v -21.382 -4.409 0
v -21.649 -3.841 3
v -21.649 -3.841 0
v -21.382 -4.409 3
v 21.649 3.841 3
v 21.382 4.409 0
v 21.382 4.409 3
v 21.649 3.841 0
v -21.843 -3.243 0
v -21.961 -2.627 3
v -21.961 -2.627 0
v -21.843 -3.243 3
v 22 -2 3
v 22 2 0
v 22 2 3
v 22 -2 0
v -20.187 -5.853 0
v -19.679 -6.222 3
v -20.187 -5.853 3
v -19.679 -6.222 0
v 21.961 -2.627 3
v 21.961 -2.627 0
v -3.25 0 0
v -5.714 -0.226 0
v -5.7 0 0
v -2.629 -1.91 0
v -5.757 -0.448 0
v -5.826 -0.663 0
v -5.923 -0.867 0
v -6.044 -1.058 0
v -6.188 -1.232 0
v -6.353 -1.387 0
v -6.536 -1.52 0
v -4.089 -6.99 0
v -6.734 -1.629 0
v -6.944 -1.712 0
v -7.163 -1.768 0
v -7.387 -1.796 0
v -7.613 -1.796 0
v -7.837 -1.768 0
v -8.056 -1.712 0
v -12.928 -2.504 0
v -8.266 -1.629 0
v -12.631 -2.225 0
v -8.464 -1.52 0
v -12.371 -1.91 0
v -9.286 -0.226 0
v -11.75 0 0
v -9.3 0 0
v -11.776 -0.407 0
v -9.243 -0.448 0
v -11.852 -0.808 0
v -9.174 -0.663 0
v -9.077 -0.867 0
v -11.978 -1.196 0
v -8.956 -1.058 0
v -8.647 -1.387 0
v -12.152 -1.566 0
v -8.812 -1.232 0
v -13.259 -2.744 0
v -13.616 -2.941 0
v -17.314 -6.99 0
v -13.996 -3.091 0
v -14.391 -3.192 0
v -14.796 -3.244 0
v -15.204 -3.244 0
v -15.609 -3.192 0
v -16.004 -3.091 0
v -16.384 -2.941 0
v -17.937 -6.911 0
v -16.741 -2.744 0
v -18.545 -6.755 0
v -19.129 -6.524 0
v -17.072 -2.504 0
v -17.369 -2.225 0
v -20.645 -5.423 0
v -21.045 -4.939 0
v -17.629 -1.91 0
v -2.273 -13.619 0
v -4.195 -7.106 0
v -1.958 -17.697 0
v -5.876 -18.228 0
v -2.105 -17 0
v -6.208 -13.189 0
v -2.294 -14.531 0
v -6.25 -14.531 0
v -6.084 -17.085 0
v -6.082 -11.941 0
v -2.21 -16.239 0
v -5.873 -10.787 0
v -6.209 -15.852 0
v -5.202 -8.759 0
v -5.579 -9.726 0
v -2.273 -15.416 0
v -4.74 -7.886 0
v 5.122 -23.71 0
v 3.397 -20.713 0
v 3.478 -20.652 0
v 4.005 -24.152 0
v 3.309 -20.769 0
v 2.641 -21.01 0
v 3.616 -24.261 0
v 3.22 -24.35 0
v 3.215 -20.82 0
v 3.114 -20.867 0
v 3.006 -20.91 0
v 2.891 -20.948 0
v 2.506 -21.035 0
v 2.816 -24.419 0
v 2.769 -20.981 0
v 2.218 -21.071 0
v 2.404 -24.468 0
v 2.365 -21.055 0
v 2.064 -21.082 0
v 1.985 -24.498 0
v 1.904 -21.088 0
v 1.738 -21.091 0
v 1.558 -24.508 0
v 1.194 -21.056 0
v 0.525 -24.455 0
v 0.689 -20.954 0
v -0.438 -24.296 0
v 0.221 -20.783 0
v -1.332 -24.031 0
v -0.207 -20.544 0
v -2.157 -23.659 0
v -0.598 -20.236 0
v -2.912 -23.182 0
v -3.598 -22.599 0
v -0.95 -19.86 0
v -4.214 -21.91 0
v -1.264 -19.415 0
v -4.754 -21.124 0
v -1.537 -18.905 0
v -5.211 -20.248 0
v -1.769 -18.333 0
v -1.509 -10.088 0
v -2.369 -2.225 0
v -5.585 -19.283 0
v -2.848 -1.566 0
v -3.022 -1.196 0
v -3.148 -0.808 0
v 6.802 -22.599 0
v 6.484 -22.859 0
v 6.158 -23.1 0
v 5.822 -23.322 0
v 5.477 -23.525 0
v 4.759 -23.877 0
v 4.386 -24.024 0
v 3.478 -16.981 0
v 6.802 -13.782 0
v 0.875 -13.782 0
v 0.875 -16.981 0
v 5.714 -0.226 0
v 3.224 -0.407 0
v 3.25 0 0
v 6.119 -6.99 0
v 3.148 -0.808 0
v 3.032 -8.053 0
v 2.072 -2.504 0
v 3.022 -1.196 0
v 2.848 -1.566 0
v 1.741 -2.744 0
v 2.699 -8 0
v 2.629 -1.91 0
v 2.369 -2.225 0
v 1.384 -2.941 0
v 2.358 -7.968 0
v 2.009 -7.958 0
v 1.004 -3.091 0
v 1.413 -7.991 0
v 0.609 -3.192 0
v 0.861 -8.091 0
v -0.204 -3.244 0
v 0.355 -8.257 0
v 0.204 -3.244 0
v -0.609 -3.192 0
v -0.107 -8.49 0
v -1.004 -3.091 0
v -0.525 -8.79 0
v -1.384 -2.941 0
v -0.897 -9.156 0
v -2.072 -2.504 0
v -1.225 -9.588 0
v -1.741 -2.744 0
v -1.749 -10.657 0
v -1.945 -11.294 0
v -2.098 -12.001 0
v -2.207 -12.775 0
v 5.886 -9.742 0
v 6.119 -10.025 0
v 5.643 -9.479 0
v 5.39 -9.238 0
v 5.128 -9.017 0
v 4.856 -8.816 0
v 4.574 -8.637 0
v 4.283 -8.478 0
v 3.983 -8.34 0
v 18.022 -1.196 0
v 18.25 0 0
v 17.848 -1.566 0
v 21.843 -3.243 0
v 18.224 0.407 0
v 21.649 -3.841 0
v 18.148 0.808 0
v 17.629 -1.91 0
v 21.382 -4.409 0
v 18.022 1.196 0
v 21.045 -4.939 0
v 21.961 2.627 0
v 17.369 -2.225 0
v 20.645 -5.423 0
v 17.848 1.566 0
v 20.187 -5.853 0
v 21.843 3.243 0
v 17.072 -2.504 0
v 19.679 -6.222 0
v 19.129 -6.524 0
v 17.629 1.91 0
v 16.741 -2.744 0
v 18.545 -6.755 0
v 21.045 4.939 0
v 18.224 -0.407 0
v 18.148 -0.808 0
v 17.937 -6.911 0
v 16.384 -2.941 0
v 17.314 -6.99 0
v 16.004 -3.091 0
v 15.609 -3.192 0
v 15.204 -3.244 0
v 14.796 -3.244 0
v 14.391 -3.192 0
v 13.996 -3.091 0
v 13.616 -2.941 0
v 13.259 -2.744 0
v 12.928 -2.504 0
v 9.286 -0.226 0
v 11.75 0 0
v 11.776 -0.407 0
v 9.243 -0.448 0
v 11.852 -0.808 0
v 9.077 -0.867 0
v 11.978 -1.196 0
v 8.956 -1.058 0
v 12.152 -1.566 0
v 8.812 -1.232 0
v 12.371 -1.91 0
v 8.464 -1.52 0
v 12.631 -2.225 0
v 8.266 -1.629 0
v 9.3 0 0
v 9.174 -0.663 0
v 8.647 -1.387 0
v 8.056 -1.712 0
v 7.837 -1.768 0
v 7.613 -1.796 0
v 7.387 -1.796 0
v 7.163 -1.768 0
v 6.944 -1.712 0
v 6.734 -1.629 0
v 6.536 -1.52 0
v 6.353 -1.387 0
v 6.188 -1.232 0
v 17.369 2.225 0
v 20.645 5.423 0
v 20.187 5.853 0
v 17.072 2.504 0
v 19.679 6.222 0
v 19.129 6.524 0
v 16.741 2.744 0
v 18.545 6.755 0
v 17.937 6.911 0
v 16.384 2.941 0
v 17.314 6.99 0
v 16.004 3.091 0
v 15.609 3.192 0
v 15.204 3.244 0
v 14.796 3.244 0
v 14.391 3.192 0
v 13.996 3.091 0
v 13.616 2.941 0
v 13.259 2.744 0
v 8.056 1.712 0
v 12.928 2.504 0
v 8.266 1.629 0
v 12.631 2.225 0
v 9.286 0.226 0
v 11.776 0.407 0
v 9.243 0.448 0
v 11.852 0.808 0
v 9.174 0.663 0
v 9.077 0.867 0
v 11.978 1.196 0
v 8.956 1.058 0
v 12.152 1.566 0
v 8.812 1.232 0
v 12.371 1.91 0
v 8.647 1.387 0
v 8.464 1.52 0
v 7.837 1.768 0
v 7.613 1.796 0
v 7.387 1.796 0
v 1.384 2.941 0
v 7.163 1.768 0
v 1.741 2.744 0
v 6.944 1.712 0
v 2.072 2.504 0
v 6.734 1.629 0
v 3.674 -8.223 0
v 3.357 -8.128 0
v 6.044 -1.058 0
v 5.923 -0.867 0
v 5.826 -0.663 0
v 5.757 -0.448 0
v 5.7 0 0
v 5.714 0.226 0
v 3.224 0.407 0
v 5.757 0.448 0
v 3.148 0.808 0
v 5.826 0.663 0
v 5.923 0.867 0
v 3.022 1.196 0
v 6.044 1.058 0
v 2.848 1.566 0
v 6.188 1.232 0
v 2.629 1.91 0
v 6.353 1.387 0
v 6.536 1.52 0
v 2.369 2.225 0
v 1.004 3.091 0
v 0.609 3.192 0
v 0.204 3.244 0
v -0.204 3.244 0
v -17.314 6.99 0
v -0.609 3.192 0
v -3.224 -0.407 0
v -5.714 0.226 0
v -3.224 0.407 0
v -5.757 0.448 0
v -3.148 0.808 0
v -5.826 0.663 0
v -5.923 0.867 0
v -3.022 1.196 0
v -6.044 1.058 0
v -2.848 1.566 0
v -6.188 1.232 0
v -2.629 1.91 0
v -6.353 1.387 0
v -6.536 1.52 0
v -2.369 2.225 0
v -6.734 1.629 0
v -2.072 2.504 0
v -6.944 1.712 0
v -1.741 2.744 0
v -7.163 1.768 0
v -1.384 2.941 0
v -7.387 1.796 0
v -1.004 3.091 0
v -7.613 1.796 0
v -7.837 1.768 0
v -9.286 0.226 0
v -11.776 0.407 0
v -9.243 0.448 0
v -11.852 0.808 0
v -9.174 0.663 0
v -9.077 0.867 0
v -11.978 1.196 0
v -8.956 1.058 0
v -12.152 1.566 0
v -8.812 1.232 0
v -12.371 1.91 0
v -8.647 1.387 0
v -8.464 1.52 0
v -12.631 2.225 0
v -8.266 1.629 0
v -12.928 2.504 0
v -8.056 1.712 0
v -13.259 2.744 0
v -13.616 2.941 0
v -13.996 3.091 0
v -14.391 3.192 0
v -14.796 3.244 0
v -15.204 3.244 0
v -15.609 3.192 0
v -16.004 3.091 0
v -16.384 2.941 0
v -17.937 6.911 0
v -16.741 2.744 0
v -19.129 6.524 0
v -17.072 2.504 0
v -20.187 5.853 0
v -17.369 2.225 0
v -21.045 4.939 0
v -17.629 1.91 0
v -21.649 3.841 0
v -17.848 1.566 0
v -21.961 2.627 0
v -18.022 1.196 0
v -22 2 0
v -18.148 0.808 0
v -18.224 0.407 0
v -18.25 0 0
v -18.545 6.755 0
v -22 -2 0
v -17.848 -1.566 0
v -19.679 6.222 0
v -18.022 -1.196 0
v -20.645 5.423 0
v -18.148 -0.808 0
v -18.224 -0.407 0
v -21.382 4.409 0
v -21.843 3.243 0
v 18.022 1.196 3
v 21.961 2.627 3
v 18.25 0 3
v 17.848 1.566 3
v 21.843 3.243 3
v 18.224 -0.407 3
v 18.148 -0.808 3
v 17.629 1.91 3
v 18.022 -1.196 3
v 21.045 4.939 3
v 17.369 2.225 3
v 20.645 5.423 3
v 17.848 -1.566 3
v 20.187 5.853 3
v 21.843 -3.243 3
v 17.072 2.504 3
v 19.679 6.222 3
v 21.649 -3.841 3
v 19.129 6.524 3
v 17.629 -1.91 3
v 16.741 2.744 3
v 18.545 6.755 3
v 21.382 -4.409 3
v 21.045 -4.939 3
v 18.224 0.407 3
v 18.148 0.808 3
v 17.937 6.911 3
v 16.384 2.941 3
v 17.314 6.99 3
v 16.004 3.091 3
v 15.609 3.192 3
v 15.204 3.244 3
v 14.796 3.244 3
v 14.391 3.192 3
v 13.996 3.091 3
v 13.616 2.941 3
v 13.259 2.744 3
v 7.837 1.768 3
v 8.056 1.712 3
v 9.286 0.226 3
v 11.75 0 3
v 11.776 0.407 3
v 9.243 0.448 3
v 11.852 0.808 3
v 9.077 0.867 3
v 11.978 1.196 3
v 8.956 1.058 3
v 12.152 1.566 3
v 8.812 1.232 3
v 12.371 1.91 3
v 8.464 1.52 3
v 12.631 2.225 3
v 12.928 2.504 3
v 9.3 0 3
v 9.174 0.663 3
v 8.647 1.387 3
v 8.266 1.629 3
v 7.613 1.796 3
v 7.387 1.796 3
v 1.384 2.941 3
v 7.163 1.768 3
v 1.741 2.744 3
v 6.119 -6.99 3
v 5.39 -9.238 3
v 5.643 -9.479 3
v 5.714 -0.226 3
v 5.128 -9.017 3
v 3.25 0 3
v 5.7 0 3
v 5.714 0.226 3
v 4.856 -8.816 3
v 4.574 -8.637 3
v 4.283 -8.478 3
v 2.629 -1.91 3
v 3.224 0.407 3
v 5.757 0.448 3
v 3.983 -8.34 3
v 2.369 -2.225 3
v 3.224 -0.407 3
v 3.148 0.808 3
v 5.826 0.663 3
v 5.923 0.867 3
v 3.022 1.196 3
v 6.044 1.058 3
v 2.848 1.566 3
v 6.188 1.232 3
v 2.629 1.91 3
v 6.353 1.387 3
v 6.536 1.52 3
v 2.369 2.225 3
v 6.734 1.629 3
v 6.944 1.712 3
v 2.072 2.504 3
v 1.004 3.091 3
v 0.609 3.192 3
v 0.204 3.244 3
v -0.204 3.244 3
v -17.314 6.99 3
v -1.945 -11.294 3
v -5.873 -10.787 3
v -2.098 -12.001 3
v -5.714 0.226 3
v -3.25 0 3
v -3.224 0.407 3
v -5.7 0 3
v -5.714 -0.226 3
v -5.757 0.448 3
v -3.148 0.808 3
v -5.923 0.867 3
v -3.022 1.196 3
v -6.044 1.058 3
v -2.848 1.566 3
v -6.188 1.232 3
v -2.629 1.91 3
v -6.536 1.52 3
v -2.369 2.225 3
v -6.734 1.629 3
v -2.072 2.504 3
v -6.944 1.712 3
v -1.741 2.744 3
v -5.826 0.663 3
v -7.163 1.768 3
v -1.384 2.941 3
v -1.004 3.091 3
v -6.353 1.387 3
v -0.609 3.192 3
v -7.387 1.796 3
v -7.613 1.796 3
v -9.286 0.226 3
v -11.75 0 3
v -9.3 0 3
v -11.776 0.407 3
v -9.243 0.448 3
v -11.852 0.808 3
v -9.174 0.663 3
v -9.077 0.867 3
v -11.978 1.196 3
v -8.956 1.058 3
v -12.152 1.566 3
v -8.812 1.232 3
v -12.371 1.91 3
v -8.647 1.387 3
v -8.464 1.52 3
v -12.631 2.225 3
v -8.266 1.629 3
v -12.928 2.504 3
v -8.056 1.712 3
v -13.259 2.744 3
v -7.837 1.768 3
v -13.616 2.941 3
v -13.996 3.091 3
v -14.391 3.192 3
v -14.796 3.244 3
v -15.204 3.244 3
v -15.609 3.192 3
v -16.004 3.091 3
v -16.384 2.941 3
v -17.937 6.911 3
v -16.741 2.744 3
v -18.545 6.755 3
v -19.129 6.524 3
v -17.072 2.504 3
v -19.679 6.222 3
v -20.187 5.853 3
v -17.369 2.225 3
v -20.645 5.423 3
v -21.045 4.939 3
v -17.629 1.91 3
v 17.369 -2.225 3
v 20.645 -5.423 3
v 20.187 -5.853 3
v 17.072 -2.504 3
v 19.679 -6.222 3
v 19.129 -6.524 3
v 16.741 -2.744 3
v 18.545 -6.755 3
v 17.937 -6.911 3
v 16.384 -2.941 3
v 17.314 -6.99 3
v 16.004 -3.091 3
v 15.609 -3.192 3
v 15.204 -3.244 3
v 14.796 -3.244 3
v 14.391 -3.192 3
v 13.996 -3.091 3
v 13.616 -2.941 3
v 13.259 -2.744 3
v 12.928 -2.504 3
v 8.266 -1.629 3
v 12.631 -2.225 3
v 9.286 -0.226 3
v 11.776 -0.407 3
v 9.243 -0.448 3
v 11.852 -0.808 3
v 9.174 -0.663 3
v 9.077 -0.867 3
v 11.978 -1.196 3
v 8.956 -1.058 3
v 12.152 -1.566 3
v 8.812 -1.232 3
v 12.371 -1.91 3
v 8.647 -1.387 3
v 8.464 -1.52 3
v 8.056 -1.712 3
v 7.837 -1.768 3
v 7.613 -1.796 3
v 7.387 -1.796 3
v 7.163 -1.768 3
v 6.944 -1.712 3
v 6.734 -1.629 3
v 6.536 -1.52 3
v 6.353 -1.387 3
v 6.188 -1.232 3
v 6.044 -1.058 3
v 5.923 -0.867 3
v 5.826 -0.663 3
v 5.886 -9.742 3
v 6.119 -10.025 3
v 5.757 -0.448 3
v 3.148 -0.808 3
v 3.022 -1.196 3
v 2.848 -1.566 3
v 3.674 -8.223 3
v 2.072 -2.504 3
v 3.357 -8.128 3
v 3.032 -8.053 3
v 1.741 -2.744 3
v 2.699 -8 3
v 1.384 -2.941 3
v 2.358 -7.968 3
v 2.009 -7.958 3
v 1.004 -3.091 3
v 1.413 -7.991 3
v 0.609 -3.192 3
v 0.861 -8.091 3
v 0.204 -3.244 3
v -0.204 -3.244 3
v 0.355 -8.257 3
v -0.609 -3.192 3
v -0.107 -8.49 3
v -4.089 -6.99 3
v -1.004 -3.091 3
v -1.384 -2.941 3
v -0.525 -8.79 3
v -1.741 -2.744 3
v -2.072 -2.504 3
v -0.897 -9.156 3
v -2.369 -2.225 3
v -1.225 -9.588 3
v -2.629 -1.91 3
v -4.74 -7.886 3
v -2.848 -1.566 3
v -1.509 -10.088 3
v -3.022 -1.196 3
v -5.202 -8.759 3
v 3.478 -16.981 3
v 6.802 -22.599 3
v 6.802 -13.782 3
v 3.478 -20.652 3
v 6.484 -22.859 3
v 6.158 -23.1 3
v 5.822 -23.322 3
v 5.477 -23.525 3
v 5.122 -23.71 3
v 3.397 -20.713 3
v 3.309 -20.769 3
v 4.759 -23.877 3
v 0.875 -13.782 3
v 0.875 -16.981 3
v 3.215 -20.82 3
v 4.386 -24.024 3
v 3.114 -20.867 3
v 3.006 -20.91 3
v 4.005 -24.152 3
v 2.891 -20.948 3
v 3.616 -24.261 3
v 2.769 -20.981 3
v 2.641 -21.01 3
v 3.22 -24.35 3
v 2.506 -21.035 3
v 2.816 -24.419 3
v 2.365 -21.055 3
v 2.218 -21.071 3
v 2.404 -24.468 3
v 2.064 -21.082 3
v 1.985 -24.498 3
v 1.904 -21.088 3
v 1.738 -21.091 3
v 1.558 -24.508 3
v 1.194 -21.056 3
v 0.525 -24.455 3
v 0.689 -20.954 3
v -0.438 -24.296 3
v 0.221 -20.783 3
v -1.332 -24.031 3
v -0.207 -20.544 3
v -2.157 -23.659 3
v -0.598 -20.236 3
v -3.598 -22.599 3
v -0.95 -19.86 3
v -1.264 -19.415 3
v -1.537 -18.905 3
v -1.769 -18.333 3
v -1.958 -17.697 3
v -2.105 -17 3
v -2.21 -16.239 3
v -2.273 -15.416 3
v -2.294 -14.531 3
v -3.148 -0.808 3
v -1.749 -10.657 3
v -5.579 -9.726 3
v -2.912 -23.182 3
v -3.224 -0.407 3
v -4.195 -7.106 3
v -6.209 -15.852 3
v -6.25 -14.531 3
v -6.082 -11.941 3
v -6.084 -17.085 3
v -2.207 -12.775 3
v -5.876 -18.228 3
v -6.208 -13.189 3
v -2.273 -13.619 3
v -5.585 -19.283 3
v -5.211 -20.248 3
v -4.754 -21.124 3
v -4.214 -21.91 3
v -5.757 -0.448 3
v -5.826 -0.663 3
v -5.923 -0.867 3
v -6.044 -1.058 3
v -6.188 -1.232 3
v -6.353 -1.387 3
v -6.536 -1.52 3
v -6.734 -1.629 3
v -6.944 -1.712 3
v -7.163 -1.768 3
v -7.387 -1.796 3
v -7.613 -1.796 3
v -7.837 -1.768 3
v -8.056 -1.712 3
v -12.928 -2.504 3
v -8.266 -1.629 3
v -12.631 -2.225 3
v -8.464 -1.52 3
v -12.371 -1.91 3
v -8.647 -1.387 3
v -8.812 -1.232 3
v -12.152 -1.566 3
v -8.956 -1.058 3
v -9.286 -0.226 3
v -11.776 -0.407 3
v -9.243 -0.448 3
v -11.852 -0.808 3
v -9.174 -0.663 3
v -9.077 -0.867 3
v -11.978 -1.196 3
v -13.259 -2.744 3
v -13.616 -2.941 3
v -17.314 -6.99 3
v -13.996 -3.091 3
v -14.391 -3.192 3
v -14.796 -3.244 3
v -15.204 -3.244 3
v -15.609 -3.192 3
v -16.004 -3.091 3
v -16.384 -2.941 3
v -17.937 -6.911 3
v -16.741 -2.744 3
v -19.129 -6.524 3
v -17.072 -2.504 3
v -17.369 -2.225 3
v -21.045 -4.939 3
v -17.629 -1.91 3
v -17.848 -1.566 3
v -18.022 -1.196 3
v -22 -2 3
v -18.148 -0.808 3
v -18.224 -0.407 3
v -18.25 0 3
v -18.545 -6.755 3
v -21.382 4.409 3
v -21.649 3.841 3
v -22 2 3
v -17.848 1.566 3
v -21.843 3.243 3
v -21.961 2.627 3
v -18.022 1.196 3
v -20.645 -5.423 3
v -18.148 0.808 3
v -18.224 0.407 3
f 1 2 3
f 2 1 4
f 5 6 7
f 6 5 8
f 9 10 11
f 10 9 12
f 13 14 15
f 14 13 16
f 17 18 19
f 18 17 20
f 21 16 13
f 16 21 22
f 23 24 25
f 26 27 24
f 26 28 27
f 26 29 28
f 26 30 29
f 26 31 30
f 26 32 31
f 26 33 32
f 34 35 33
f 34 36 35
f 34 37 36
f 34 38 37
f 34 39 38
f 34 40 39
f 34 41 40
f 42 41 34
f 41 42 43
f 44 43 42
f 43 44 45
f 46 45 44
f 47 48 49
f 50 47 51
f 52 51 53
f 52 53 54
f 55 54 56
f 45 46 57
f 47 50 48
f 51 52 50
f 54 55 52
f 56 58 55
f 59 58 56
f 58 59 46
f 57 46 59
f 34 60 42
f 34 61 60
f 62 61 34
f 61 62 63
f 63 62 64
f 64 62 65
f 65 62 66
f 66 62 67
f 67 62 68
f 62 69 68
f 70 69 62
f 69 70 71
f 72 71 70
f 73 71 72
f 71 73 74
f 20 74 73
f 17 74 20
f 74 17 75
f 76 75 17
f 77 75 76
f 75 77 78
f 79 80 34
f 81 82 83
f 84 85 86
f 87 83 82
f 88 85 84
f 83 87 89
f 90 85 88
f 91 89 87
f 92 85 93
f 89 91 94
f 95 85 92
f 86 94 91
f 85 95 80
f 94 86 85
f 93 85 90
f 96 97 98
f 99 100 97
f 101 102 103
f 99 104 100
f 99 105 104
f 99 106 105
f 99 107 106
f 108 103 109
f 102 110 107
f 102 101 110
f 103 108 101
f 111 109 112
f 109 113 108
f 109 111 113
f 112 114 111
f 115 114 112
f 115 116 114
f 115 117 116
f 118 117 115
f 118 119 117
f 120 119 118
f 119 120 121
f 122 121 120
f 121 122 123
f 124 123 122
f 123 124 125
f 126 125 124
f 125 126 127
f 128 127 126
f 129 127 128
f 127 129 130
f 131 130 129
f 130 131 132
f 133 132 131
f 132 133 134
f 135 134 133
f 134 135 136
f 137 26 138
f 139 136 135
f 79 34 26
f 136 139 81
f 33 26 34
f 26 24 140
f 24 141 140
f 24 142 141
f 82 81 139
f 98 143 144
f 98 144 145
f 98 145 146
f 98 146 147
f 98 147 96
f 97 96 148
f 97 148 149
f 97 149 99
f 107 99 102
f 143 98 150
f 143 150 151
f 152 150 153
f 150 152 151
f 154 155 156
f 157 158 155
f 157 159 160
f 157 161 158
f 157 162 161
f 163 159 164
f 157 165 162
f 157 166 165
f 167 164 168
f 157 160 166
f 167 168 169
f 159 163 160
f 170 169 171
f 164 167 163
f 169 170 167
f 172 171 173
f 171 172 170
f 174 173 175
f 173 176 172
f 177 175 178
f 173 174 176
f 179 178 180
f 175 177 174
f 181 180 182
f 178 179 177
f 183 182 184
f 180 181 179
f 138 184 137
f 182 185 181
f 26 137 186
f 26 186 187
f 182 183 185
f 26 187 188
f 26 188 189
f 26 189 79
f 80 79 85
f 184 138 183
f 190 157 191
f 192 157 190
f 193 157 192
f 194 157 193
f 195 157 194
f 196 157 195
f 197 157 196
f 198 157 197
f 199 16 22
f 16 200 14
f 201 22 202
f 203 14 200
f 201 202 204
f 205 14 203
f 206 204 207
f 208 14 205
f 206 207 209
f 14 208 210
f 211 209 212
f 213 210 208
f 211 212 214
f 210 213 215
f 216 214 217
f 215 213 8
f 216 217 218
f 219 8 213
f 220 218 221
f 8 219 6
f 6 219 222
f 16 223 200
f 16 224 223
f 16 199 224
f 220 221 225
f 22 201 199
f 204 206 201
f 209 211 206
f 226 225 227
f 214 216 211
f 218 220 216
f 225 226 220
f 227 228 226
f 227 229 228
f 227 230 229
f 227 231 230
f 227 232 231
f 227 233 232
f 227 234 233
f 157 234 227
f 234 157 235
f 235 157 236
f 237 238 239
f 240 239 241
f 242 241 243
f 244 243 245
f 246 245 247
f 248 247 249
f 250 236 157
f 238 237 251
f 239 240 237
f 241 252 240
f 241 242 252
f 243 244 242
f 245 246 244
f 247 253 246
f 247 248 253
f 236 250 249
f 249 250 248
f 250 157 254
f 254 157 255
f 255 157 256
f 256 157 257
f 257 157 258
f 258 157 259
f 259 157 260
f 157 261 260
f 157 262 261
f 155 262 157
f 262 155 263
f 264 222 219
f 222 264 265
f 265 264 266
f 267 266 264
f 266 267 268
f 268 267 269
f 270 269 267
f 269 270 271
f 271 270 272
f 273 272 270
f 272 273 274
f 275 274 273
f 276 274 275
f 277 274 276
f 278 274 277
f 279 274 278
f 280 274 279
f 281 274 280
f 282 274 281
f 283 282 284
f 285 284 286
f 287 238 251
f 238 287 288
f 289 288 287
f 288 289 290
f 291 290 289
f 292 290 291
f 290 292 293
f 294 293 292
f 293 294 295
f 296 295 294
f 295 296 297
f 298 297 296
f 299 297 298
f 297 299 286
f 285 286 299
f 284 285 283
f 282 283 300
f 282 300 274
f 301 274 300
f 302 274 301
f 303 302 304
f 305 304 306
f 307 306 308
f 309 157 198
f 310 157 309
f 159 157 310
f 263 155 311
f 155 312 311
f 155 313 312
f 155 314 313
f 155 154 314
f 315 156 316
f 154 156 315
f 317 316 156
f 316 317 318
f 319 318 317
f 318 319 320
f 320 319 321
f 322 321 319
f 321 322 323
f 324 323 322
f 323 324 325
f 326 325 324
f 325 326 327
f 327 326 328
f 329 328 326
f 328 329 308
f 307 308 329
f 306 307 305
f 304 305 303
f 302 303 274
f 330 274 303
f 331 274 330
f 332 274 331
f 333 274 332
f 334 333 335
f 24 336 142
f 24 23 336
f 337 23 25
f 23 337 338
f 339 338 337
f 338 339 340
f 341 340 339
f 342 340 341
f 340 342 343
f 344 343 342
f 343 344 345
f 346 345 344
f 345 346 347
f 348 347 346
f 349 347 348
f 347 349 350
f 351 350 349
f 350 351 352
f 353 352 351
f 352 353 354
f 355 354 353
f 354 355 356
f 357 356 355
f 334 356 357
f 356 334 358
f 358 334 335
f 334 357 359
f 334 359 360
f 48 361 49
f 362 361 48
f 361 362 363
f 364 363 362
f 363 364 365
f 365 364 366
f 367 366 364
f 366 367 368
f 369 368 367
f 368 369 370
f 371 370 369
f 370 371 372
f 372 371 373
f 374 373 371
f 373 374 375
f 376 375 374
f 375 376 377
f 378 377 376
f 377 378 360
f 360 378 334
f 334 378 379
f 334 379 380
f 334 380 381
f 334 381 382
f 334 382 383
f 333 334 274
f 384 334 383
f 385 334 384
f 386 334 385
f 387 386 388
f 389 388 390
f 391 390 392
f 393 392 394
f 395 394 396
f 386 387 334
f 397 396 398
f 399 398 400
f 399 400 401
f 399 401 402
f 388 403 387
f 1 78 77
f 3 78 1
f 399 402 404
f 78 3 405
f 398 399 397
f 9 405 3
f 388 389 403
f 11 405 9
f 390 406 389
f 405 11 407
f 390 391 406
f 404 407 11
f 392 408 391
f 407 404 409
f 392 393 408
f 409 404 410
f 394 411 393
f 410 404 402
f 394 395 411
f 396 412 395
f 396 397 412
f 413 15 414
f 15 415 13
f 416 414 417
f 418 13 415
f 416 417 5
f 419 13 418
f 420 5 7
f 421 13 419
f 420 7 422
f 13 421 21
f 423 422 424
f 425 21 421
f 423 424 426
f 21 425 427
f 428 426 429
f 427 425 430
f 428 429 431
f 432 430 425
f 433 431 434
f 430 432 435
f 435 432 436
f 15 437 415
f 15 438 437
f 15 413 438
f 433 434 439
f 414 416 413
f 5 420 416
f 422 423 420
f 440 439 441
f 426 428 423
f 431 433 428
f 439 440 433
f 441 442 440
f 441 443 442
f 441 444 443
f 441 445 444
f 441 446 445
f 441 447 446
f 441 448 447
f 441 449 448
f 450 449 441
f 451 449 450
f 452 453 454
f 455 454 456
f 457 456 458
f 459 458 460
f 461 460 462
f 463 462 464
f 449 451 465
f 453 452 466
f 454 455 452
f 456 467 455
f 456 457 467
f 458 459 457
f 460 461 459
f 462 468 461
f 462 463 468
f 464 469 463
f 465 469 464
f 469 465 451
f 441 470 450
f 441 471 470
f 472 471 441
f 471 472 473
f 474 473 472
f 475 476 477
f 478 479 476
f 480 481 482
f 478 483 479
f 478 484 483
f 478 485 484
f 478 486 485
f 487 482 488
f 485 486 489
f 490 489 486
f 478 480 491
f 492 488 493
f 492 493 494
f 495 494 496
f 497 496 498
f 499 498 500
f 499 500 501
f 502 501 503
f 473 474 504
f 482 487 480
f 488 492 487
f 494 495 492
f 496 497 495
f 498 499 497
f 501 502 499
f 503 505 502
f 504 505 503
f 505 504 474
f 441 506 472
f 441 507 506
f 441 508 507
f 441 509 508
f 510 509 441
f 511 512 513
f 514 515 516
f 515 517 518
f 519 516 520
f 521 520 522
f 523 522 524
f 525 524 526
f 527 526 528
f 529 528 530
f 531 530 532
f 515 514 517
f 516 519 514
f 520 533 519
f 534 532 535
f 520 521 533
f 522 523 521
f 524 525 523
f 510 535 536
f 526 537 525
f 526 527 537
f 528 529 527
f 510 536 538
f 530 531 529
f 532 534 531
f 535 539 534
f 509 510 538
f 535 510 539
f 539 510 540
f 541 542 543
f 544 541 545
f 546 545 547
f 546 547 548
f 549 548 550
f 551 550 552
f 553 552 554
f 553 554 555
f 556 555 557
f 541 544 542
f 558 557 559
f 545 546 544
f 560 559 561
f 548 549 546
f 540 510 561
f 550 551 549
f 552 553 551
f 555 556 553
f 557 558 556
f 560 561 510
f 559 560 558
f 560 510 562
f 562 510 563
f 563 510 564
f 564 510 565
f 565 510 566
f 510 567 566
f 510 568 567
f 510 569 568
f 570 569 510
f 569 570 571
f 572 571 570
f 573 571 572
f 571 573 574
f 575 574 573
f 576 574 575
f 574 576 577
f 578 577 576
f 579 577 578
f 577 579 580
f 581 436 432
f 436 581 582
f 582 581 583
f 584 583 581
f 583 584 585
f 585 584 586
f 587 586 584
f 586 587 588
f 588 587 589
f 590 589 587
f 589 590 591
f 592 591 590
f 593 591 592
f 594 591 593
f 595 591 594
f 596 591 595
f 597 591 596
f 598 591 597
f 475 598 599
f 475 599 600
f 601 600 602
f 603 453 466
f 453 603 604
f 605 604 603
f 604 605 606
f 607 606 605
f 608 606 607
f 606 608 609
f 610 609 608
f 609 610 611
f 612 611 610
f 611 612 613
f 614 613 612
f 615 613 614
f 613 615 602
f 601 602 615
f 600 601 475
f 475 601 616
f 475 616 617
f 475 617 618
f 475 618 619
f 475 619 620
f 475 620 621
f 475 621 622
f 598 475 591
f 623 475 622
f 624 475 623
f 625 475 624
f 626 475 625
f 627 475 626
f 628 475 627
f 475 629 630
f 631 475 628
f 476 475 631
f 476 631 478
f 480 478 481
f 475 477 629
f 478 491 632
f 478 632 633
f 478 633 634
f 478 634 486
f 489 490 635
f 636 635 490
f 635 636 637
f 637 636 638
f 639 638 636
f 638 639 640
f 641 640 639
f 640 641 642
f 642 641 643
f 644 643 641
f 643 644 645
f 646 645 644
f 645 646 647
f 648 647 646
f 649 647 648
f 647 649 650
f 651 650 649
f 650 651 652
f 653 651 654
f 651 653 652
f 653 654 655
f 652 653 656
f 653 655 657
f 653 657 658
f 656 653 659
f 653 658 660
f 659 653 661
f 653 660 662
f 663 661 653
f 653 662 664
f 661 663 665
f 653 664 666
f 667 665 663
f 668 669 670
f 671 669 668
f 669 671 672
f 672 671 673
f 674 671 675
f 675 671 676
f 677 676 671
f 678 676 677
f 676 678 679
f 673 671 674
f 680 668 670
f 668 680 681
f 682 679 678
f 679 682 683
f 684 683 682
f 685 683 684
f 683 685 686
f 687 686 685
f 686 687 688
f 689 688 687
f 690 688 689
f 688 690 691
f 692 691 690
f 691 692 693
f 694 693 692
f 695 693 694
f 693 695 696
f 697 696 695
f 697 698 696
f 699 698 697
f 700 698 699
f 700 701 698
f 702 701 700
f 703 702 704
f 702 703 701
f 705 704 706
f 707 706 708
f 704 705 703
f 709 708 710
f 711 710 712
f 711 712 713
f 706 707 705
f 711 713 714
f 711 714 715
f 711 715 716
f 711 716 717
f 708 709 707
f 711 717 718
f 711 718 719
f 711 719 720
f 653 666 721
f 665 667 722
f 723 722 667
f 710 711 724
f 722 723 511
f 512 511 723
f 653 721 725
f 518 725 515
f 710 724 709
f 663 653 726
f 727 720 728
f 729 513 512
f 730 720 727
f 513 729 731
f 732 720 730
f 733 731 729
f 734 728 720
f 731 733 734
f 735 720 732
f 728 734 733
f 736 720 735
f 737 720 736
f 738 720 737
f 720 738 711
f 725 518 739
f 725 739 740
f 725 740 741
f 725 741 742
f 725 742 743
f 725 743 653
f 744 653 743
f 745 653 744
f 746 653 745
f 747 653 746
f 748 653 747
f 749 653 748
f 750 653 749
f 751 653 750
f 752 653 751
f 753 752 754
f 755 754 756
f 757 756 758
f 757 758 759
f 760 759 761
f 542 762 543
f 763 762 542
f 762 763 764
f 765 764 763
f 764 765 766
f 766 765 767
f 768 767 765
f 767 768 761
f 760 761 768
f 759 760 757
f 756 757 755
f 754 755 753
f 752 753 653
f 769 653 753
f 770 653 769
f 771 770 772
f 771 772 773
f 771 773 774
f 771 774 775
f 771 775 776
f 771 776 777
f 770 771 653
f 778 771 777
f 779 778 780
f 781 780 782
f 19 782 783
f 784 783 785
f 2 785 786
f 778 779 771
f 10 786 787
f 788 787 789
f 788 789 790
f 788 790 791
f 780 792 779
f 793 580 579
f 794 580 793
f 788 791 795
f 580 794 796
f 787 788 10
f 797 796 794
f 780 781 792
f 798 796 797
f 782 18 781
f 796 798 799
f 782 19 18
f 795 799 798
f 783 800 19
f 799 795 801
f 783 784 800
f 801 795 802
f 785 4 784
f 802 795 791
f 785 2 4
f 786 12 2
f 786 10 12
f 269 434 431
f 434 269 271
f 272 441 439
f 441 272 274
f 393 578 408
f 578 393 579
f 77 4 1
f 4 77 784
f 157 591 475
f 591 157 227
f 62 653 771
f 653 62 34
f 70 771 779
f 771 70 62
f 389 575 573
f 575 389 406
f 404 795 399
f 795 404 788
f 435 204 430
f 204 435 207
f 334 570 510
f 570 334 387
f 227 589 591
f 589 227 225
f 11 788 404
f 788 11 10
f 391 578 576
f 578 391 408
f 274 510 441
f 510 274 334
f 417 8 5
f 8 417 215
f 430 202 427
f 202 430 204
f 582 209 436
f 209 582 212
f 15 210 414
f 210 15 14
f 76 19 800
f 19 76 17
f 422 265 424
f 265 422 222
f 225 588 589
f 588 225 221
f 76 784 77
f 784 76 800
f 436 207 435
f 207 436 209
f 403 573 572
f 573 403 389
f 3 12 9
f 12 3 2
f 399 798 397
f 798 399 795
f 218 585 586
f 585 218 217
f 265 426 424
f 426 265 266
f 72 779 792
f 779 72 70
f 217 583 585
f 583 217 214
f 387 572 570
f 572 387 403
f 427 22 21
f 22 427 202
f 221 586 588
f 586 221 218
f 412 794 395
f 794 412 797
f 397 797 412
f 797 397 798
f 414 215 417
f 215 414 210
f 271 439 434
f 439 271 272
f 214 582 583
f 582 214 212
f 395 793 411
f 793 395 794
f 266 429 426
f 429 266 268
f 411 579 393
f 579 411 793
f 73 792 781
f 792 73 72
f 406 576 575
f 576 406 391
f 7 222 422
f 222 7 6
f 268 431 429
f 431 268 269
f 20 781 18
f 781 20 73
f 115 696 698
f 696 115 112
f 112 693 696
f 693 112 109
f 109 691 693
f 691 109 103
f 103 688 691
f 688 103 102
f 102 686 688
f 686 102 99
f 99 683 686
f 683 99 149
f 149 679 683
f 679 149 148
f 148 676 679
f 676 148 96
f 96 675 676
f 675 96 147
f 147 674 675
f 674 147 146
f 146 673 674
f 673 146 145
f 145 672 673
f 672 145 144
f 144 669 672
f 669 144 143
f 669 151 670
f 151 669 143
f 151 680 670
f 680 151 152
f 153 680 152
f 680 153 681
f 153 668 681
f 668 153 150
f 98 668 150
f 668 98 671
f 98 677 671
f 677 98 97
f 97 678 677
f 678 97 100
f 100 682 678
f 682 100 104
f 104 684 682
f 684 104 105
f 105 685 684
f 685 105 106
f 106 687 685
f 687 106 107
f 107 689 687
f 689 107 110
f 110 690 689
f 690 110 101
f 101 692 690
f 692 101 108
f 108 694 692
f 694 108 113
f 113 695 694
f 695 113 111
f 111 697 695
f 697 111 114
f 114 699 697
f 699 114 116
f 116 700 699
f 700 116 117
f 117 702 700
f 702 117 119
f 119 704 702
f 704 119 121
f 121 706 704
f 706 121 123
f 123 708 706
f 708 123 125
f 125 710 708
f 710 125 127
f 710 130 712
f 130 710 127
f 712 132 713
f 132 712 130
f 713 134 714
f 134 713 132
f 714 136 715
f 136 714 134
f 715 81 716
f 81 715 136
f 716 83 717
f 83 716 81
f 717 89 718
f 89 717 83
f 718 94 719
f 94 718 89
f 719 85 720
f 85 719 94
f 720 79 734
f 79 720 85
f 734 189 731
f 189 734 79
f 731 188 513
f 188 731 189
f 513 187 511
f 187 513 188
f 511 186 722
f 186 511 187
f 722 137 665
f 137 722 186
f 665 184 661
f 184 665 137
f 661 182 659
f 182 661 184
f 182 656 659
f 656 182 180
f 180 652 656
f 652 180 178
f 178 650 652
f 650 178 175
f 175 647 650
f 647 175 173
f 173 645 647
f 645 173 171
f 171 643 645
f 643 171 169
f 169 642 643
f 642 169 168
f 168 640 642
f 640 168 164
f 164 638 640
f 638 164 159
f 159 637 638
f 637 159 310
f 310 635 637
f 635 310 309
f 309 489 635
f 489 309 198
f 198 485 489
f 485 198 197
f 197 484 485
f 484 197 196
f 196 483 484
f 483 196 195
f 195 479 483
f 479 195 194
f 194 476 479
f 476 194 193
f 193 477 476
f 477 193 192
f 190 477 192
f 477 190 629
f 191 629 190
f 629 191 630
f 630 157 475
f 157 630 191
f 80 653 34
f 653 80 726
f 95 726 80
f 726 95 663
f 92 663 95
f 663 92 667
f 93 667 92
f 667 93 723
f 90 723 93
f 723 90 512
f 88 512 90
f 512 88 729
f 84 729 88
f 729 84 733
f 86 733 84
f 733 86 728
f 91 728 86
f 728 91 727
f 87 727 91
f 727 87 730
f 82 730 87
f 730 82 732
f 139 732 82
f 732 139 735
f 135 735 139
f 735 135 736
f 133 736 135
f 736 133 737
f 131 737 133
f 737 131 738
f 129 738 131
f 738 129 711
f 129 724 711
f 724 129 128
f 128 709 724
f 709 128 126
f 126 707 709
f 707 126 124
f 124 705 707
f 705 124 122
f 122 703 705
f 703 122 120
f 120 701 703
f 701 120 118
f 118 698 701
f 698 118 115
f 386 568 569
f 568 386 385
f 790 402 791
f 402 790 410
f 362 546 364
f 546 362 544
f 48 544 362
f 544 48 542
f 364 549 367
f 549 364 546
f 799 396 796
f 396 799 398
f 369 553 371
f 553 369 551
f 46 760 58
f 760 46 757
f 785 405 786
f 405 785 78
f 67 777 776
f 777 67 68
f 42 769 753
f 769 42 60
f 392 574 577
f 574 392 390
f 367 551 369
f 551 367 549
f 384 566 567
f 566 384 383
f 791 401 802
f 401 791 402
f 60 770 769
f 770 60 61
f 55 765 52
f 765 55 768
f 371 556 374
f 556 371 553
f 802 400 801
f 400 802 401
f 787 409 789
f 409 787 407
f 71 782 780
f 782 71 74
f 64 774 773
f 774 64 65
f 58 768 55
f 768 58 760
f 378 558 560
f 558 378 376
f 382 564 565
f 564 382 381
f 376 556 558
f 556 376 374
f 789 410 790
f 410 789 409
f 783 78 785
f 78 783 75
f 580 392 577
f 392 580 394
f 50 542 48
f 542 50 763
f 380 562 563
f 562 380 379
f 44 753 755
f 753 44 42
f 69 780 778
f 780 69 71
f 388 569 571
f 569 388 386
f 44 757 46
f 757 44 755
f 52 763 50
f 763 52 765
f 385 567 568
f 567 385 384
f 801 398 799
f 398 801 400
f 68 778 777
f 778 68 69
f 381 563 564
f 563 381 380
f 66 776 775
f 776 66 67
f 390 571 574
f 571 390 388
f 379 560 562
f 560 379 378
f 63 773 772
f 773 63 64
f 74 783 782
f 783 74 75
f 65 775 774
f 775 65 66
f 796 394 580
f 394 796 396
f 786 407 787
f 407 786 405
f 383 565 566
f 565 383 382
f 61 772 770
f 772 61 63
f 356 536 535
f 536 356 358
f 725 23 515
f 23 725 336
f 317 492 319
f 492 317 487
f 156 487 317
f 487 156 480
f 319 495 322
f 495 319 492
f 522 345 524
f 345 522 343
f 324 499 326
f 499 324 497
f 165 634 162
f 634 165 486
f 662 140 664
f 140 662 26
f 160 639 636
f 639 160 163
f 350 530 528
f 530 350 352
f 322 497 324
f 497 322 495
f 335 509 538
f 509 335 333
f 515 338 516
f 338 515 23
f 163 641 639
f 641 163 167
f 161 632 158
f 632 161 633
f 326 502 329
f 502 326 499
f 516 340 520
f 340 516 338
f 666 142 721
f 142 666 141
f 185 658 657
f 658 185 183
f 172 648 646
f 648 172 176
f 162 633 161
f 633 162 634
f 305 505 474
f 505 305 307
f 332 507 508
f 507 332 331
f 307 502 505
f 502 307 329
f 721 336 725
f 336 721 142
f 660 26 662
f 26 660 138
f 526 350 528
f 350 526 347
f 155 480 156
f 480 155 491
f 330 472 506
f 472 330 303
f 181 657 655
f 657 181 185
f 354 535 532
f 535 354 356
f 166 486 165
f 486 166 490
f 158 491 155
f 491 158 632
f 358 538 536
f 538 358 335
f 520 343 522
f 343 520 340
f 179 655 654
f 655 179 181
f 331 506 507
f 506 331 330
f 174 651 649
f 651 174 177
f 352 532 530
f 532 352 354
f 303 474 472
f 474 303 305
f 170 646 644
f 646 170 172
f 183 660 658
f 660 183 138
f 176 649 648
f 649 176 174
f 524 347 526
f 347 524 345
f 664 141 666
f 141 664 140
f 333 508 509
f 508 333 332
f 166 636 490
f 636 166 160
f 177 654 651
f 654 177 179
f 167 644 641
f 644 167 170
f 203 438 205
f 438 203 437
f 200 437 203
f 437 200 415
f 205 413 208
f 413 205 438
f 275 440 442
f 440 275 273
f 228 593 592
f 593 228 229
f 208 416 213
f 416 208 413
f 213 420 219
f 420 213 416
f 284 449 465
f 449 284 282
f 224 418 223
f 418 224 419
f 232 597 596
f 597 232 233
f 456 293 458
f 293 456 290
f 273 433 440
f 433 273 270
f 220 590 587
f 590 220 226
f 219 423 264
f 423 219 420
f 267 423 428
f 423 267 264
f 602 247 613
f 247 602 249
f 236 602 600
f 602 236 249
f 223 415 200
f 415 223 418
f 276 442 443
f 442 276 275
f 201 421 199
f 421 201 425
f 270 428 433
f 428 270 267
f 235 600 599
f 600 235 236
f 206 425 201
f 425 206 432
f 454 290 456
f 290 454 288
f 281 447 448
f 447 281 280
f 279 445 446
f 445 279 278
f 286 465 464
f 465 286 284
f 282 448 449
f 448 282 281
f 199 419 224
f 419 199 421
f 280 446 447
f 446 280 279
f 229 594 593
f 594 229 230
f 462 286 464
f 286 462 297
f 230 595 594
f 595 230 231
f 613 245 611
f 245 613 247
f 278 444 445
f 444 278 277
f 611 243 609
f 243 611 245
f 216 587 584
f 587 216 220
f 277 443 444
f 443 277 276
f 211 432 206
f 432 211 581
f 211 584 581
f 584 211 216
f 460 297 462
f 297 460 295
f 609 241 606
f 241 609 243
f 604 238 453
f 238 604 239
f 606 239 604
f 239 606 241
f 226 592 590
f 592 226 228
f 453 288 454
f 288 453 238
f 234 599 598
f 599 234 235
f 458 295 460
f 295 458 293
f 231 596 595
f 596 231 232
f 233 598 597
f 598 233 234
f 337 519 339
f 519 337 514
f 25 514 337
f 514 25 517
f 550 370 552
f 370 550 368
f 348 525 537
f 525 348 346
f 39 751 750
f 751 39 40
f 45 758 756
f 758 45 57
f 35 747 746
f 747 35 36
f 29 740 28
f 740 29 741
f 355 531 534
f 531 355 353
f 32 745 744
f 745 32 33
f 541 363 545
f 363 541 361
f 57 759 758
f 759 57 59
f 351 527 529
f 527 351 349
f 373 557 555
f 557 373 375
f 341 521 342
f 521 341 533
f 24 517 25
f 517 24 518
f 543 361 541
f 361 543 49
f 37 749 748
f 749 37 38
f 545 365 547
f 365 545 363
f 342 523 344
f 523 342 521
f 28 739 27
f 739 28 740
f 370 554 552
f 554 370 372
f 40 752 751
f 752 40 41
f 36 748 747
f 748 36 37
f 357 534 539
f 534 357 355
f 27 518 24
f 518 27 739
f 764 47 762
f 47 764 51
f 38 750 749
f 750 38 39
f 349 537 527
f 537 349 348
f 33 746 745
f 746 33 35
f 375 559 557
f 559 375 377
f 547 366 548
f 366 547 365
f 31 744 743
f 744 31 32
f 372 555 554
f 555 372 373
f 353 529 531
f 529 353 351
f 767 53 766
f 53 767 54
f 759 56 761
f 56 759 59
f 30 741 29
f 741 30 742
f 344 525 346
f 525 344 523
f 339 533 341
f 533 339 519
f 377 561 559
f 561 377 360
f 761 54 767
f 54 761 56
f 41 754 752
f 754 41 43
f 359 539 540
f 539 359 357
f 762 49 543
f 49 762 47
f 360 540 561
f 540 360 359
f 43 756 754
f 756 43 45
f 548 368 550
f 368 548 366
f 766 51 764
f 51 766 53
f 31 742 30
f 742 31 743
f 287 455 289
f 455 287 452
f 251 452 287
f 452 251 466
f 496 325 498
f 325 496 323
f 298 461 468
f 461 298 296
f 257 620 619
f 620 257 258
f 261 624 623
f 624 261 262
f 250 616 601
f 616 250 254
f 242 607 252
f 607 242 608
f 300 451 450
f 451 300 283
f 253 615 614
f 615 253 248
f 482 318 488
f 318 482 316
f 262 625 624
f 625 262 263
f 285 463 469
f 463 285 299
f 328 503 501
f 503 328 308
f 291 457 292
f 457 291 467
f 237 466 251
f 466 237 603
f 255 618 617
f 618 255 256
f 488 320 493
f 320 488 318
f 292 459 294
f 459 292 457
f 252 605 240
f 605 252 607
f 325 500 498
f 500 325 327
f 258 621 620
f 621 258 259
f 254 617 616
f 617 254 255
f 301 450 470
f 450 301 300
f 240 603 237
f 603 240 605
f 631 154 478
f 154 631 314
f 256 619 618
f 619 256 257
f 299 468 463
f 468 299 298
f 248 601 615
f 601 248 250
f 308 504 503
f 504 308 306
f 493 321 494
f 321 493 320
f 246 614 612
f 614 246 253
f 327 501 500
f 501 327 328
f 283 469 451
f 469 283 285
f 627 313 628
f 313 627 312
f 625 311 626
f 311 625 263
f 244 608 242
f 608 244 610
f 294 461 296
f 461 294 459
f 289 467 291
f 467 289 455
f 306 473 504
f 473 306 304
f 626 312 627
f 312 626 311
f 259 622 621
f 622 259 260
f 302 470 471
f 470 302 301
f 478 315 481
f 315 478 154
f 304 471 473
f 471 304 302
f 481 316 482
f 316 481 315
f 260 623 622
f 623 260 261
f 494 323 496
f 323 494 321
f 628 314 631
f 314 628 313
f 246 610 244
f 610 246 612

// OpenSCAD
$fn = 50;


difference() {
	union() {
		hull() {
			translate(v = [-17.0000000000, 2.0000000000, 0]) {
				cylinder(h = 3, r = 5);
			}
			translate(v = [17.0000000000, 2.0000000000, 0]) {
				cylinder(h = 3, r = 5);
			}
			translate(v = [-17.0000000000, -2.0000000000, 0]) {
				cylinder(h = 3, r = 5);
			}
			translate(v = [17.0000000000, -2.0000000000, 0]) {
				cylinder(h = 3, r = 5);
			}
		}
		translate(v = [0, -5, 0]) {
			linear_extrude(height = 3) {
				text(font = "DejaVu Sans Mono:style=Bold", halign = "center", size = 19.0000000000, text = "G", valign = "top");
			}
		}
	}
	union() {
		translate(v = [-15.0000000000, 0.0000000000, 0]) {
			translate(v = [0, 0, -100]) {
				cylinder(h = 200, r = 3.2500000000);
			}
		}
		translate(v = [0, 0, -100]) {
			cylinder(h = 200, r = 3.2500000000);
		}
		translate(v = [15.0000000000, 0.0000000000, 0]) {
			translate(v = [0, 0, -100]) {
				cylinder(h = 200, r = 3.2500000000);
			}
		}
		translate(v = [-15.0000000000, 0.0000000000, 0]) {
			translate(v = [0, 0, -100]) {
				cylinder(h = 200, r = 1.8000000000);
			}
		}
		translate(v = [-7.5000000000, 0.0000000000, 0]) {
			translate(v = [0, 0, -100]) {
				cylinder(h = 200, r = 1.8000000000);
			}
		}
		translate(v = [0, 0, -100]) {
			cylinder(h = 200, r = 1.8000000000);
		}
		translate(v = [7.5000000000, 0.0000000000, 0]) {
			translate(v = [0, 0, -100]) {
				cylinder(h = 200, r = 1.8000000000);
			}
		}
		translate(v = [15.0000000000, 0.0000000000, 0]) {
			translate(v = [0, 0, -100]) {
				cylinder(h = 200, r = 1.8000000000);
			}
		}
	}
}
